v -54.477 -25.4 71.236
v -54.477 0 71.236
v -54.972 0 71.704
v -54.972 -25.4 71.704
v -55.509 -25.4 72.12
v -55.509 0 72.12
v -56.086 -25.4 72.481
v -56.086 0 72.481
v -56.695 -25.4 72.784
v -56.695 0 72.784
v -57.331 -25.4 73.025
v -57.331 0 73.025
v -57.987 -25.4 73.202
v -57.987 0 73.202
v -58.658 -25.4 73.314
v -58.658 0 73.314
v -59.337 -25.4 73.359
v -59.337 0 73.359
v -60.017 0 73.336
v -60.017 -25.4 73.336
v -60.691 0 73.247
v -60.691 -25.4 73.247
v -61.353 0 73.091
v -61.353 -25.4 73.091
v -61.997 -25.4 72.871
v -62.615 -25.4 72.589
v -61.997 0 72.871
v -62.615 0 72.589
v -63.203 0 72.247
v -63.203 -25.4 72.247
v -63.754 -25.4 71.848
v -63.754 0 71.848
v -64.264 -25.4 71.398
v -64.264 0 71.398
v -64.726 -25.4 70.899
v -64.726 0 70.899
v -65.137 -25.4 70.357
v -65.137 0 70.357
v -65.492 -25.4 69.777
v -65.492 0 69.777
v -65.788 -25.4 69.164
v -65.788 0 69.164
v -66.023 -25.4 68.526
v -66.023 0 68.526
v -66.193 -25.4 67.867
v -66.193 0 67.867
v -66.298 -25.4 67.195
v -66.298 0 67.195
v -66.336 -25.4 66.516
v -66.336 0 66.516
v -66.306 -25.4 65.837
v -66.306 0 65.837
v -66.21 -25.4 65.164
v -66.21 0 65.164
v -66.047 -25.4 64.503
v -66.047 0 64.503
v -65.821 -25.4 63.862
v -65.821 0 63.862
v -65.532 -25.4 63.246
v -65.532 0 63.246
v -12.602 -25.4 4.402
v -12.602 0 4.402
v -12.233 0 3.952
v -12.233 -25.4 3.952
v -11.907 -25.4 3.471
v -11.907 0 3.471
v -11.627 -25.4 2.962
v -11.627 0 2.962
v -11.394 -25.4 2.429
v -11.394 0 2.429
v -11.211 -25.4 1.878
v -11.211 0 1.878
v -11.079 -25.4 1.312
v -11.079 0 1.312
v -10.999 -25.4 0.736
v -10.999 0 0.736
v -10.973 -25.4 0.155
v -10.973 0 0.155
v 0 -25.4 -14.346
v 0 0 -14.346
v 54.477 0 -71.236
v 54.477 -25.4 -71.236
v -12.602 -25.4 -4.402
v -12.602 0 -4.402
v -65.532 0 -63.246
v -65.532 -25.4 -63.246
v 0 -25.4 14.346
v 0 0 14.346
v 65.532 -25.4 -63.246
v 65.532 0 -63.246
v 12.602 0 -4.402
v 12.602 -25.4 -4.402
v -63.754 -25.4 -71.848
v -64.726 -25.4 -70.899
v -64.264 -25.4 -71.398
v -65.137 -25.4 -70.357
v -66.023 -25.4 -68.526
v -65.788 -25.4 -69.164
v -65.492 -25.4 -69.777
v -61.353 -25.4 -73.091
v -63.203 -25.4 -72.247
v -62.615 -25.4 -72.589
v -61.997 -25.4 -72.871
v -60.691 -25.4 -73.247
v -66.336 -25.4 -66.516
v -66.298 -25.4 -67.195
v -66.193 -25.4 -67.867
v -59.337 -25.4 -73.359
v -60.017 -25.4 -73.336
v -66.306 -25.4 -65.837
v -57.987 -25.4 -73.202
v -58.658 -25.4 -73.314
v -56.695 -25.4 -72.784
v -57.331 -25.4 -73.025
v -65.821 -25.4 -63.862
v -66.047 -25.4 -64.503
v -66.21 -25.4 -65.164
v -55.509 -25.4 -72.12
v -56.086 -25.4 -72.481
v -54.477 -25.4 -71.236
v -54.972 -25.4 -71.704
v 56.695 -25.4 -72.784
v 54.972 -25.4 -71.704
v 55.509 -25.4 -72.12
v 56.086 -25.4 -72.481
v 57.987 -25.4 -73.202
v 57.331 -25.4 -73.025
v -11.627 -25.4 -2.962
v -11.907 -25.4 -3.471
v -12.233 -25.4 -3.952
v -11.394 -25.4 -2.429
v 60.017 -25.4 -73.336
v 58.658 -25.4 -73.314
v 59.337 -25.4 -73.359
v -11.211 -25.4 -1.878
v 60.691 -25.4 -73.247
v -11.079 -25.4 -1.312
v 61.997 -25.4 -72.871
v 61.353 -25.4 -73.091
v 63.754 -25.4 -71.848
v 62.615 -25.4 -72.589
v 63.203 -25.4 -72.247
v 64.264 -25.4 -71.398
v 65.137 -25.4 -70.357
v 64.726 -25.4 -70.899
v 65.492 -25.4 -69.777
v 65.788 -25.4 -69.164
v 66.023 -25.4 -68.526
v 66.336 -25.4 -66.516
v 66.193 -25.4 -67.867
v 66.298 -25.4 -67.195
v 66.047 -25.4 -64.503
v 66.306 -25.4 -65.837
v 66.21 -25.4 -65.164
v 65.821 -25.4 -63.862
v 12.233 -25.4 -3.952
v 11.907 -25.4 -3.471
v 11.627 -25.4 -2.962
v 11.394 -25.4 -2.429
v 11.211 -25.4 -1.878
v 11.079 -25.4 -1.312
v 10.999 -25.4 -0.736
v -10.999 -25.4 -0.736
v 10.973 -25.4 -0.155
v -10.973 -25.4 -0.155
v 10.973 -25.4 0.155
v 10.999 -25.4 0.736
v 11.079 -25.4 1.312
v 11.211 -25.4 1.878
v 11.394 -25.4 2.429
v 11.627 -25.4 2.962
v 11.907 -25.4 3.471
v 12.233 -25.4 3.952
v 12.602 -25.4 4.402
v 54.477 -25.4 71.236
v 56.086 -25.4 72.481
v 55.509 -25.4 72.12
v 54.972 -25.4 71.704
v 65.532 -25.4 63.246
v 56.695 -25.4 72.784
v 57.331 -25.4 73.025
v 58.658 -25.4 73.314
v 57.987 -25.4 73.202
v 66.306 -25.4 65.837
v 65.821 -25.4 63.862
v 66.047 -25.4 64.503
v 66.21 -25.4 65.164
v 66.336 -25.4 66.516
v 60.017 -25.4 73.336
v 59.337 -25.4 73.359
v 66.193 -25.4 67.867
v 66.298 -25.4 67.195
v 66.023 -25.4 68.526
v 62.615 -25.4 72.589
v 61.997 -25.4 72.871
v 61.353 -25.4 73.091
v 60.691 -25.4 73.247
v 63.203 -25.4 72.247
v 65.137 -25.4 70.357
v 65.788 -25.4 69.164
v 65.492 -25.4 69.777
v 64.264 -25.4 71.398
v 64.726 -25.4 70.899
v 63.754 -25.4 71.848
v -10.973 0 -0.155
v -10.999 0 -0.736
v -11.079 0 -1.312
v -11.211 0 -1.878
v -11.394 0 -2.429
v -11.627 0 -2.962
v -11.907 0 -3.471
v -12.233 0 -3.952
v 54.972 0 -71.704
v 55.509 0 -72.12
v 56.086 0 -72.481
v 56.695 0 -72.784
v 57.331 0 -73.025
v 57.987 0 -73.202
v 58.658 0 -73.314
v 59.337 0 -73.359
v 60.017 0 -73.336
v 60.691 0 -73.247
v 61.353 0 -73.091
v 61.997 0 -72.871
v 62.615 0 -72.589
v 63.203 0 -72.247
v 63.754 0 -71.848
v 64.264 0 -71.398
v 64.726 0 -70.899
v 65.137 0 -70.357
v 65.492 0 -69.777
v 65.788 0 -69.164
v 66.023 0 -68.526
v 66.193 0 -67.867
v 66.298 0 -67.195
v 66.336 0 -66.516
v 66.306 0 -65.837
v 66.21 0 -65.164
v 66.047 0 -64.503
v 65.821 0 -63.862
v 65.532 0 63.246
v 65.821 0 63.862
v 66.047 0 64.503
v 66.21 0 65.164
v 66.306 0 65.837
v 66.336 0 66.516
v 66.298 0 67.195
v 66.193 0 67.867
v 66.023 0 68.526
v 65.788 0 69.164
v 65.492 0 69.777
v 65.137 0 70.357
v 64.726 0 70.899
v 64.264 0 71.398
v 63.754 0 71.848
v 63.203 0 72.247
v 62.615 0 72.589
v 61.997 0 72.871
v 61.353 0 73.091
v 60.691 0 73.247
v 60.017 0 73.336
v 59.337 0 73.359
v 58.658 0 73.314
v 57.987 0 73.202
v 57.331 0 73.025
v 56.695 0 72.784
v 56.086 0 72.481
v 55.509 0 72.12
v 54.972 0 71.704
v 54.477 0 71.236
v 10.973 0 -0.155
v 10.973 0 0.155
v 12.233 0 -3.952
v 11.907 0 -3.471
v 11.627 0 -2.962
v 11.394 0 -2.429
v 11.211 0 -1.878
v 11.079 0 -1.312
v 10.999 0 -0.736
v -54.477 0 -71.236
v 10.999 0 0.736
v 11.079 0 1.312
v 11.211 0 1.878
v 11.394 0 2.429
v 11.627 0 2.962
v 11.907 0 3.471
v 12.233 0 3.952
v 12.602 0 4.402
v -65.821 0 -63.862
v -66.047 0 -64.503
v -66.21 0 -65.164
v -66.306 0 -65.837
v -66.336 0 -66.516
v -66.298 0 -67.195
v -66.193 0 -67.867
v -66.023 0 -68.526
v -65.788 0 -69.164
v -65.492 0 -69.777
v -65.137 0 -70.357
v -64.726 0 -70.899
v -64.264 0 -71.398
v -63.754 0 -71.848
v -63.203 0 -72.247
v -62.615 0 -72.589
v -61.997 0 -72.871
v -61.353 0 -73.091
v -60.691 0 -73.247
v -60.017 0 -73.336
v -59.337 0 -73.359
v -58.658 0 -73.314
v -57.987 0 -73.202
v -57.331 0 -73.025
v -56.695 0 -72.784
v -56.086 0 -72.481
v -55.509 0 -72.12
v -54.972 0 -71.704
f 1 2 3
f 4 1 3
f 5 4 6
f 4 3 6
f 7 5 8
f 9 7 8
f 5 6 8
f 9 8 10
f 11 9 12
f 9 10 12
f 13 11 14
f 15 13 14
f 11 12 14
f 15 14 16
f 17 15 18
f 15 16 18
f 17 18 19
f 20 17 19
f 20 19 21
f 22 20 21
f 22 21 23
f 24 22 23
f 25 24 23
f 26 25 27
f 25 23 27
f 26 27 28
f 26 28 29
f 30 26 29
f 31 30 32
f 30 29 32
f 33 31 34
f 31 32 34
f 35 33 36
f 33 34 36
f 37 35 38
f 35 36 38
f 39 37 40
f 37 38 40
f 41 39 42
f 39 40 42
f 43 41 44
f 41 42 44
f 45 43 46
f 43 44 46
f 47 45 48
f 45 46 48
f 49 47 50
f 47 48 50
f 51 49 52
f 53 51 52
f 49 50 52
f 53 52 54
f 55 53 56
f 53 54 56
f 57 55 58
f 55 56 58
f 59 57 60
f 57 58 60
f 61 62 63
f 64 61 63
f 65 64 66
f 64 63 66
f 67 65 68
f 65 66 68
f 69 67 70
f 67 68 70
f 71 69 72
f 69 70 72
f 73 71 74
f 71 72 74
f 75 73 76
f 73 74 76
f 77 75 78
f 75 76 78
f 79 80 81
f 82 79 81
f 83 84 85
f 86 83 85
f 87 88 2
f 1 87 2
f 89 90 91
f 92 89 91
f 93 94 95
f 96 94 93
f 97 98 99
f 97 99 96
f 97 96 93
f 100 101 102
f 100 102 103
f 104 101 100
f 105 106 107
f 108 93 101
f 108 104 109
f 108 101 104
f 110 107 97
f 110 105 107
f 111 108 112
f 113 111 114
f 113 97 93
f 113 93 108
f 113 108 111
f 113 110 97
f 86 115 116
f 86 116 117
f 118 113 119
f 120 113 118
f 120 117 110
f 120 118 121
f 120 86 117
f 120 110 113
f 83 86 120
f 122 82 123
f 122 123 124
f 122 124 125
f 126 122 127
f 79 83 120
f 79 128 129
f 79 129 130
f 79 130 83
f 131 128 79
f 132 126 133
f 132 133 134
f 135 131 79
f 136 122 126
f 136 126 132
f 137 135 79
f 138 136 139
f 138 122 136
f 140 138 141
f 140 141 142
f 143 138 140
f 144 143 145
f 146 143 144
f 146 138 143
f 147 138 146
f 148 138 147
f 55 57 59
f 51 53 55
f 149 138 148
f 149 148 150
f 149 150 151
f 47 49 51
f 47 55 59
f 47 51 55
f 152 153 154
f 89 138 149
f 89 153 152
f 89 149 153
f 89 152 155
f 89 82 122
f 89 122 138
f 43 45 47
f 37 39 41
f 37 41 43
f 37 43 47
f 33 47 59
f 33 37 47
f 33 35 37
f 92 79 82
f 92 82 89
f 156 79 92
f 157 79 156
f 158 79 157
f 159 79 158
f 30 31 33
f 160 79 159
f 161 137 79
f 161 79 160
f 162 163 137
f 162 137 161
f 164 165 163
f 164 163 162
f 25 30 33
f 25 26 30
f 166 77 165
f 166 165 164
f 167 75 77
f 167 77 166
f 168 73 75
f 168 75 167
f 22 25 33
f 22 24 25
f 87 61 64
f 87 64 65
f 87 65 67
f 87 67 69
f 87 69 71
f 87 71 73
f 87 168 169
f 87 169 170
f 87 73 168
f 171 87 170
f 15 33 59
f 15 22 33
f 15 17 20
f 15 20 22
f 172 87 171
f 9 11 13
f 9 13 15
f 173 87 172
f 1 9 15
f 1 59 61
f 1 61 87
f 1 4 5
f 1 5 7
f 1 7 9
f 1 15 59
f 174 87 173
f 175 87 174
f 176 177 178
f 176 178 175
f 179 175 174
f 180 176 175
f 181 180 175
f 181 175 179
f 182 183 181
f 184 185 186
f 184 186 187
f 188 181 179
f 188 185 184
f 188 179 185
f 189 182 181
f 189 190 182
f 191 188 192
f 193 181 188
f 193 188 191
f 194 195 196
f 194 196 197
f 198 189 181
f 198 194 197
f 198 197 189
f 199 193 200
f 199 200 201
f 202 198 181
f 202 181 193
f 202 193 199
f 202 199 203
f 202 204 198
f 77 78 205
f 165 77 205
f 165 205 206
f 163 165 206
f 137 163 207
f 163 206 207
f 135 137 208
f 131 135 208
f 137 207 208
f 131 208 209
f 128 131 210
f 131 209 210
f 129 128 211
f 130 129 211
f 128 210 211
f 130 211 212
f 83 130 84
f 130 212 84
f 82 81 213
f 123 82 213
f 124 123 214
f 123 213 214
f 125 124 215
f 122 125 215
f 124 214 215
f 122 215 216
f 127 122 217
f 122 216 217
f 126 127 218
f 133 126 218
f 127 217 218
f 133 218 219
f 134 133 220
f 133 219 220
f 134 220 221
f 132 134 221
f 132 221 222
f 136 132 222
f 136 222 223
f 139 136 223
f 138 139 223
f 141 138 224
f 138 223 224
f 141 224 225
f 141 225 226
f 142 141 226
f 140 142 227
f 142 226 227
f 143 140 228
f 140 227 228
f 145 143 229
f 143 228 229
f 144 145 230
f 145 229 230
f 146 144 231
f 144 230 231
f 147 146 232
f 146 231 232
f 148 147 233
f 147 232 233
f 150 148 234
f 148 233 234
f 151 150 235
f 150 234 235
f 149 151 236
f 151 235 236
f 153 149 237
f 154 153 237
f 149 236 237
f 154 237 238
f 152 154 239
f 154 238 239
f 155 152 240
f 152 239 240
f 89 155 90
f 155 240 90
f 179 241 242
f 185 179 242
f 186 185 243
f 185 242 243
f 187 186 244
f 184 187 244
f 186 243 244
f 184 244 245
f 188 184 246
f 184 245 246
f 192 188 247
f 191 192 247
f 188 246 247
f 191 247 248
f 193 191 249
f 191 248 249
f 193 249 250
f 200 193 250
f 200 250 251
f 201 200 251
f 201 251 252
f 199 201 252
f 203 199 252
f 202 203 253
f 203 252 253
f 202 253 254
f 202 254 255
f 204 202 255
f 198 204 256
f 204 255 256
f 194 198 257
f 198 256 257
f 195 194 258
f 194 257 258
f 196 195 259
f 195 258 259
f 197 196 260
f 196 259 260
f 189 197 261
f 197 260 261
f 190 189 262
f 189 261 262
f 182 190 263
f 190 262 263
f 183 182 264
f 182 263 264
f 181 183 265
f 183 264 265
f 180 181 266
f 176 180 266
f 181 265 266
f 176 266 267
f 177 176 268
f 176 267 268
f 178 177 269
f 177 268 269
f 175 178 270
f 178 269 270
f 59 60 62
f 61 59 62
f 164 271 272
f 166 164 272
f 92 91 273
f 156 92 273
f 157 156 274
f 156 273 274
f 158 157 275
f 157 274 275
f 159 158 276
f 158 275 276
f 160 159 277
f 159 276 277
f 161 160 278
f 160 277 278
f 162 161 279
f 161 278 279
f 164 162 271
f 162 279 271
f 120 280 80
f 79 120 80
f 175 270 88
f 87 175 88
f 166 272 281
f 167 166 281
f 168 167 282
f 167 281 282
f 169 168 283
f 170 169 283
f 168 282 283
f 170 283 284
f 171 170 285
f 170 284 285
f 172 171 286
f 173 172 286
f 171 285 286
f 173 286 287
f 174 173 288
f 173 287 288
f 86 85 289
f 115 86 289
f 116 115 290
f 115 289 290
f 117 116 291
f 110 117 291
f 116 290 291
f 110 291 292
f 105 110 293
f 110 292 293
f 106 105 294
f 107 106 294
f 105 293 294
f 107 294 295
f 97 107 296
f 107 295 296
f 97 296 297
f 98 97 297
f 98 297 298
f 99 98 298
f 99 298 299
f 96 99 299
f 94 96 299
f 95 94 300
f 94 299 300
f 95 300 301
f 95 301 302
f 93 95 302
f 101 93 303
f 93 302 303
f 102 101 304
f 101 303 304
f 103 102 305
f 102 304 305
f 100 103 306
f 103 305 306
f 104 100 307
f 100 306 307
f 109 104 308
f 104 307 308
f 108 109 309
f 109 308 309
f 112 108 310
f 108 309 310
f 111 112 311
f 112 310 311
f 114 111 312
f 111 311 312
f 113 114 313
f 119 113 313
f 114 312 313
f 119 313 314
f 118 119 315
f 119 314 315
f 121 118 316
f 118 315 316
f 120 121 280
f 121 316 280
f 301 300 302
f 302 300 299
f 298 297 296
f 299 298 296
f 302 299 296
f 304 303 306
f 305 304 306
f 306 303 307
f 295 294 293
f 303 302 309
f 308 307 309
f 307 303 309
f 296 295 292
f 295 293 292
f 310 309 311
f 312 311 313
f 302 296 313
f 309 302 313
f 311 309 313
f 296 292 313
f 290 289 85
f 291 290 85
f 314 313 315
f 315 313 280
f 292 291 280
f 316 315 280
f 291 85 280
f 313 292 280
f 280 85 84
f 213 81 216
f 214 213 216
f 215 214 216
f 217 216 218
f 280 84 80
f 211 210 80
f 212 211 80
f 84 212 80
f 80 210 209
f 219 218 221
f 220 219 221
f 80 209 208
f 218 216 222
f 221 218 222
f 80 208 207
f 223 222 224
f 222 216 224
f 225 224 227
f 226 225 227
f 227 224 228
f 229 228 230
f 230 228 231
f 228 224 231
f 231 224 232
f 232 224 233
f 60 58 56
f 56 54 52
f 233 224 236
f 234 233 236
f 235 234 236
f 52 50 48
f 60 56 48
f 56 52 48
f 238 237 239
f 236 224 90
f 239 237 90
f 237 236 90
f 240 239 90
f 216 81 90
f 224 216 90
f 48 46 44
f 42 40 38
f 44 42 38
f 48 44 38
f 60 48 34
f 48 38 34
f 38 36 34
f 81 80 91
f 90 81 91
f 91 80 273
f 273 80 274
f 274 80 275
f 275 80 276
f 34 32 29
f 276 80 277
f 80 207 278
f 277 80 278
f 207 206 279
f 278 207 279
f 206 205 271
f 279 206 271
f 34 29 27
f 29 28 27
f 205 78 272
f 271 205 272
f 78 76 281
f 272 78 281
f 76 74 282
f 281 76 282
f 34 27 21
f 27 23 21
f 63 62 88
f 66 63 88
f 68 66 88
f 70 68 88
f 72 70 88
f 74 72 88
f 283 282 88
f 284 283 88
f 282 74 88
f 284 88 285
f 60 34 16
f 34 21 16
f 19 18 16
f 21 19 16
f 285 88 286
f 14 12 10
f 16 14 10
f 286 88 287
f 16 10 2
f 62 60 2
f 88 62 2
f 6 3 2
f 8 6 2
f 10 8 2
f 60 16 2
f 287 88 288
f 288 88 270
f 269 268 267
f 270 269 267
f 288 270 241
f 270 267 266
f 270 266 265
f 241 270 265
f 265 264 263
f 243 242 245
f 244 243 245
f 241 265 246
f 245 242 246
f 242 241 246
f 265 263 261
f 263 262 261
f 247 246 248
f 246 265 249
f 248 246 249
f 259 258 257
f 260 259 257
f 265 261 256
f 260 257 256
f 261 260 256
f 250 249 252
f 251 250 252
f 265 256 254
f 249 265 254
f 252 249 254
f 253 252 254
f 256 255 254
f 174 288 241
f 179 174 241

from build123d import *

# Parameters (mm, degrees)
F1_DEPTH = 25.4


with BuildPart() as f1:
    # F0 (on Front) → F1 (new body)
    with BuildSketch(Plane.XZ):
        with BuildLine():
            Line((-54.477422, -71.236187), (0, -14.34601))
            Line((0, -14.34601), (54.477422, -71.236187))
            ThreePointArc((54.477422, -71.236187), (63.483736, -72.054395), (65.532006, -63.246004))
            Line((65.532006, -63.246004), (12.601703, -4.401703))
            ThreePointArc((12.601703, -4.401703), (11.393994, -2.42924), (10.9728, -0.155088))
            Line((10.9728, -0.155088), (10.9728, 0.155088))
            ThreePointArc((10.9728, 0.155088), (11.393994, 2.42924), (12.601703, 4.401703))
            Line((12.601703, 4.401703), (65.532006, 63.246004))
            ThreePointArc((65.532006, 63.246004), (63.483736, 72.054395), (54.477422, 71.236187))
            Line((54.477422, 71.236187), (0, 14.34601))
            Line((0, 14.34601), (-54.477422, 71.236187))
            ThreePointArc((-54.477422, 71.236187), (-63.483736, 72.054395), (-65.532006, 63.246004))
            Line((-65.532006, 63.246004), (-12.601703, 4.401703))
            ThreePointArc((-12.601703, 4.401703), (-11.393994, 2.42924), (-10.9728, 0.155088))
            Line((-10.9728, 0.155088), (-10.9728, -0.155088))
            ThreePointArc((-10.9728, -0.155088), (-11.393994, -2.42924), (-12.601703, -4.401703))
            Line((-12.601703, -4.401703), (-65.532006, -63.246004))
            ThreePointArc((-65.532006, -63.246004), (-63.483736, -72.054395), (-54.477422, -71.236187))
        make_face()
    extrude(amount=F1_DEPTH)


solid = f1.part
